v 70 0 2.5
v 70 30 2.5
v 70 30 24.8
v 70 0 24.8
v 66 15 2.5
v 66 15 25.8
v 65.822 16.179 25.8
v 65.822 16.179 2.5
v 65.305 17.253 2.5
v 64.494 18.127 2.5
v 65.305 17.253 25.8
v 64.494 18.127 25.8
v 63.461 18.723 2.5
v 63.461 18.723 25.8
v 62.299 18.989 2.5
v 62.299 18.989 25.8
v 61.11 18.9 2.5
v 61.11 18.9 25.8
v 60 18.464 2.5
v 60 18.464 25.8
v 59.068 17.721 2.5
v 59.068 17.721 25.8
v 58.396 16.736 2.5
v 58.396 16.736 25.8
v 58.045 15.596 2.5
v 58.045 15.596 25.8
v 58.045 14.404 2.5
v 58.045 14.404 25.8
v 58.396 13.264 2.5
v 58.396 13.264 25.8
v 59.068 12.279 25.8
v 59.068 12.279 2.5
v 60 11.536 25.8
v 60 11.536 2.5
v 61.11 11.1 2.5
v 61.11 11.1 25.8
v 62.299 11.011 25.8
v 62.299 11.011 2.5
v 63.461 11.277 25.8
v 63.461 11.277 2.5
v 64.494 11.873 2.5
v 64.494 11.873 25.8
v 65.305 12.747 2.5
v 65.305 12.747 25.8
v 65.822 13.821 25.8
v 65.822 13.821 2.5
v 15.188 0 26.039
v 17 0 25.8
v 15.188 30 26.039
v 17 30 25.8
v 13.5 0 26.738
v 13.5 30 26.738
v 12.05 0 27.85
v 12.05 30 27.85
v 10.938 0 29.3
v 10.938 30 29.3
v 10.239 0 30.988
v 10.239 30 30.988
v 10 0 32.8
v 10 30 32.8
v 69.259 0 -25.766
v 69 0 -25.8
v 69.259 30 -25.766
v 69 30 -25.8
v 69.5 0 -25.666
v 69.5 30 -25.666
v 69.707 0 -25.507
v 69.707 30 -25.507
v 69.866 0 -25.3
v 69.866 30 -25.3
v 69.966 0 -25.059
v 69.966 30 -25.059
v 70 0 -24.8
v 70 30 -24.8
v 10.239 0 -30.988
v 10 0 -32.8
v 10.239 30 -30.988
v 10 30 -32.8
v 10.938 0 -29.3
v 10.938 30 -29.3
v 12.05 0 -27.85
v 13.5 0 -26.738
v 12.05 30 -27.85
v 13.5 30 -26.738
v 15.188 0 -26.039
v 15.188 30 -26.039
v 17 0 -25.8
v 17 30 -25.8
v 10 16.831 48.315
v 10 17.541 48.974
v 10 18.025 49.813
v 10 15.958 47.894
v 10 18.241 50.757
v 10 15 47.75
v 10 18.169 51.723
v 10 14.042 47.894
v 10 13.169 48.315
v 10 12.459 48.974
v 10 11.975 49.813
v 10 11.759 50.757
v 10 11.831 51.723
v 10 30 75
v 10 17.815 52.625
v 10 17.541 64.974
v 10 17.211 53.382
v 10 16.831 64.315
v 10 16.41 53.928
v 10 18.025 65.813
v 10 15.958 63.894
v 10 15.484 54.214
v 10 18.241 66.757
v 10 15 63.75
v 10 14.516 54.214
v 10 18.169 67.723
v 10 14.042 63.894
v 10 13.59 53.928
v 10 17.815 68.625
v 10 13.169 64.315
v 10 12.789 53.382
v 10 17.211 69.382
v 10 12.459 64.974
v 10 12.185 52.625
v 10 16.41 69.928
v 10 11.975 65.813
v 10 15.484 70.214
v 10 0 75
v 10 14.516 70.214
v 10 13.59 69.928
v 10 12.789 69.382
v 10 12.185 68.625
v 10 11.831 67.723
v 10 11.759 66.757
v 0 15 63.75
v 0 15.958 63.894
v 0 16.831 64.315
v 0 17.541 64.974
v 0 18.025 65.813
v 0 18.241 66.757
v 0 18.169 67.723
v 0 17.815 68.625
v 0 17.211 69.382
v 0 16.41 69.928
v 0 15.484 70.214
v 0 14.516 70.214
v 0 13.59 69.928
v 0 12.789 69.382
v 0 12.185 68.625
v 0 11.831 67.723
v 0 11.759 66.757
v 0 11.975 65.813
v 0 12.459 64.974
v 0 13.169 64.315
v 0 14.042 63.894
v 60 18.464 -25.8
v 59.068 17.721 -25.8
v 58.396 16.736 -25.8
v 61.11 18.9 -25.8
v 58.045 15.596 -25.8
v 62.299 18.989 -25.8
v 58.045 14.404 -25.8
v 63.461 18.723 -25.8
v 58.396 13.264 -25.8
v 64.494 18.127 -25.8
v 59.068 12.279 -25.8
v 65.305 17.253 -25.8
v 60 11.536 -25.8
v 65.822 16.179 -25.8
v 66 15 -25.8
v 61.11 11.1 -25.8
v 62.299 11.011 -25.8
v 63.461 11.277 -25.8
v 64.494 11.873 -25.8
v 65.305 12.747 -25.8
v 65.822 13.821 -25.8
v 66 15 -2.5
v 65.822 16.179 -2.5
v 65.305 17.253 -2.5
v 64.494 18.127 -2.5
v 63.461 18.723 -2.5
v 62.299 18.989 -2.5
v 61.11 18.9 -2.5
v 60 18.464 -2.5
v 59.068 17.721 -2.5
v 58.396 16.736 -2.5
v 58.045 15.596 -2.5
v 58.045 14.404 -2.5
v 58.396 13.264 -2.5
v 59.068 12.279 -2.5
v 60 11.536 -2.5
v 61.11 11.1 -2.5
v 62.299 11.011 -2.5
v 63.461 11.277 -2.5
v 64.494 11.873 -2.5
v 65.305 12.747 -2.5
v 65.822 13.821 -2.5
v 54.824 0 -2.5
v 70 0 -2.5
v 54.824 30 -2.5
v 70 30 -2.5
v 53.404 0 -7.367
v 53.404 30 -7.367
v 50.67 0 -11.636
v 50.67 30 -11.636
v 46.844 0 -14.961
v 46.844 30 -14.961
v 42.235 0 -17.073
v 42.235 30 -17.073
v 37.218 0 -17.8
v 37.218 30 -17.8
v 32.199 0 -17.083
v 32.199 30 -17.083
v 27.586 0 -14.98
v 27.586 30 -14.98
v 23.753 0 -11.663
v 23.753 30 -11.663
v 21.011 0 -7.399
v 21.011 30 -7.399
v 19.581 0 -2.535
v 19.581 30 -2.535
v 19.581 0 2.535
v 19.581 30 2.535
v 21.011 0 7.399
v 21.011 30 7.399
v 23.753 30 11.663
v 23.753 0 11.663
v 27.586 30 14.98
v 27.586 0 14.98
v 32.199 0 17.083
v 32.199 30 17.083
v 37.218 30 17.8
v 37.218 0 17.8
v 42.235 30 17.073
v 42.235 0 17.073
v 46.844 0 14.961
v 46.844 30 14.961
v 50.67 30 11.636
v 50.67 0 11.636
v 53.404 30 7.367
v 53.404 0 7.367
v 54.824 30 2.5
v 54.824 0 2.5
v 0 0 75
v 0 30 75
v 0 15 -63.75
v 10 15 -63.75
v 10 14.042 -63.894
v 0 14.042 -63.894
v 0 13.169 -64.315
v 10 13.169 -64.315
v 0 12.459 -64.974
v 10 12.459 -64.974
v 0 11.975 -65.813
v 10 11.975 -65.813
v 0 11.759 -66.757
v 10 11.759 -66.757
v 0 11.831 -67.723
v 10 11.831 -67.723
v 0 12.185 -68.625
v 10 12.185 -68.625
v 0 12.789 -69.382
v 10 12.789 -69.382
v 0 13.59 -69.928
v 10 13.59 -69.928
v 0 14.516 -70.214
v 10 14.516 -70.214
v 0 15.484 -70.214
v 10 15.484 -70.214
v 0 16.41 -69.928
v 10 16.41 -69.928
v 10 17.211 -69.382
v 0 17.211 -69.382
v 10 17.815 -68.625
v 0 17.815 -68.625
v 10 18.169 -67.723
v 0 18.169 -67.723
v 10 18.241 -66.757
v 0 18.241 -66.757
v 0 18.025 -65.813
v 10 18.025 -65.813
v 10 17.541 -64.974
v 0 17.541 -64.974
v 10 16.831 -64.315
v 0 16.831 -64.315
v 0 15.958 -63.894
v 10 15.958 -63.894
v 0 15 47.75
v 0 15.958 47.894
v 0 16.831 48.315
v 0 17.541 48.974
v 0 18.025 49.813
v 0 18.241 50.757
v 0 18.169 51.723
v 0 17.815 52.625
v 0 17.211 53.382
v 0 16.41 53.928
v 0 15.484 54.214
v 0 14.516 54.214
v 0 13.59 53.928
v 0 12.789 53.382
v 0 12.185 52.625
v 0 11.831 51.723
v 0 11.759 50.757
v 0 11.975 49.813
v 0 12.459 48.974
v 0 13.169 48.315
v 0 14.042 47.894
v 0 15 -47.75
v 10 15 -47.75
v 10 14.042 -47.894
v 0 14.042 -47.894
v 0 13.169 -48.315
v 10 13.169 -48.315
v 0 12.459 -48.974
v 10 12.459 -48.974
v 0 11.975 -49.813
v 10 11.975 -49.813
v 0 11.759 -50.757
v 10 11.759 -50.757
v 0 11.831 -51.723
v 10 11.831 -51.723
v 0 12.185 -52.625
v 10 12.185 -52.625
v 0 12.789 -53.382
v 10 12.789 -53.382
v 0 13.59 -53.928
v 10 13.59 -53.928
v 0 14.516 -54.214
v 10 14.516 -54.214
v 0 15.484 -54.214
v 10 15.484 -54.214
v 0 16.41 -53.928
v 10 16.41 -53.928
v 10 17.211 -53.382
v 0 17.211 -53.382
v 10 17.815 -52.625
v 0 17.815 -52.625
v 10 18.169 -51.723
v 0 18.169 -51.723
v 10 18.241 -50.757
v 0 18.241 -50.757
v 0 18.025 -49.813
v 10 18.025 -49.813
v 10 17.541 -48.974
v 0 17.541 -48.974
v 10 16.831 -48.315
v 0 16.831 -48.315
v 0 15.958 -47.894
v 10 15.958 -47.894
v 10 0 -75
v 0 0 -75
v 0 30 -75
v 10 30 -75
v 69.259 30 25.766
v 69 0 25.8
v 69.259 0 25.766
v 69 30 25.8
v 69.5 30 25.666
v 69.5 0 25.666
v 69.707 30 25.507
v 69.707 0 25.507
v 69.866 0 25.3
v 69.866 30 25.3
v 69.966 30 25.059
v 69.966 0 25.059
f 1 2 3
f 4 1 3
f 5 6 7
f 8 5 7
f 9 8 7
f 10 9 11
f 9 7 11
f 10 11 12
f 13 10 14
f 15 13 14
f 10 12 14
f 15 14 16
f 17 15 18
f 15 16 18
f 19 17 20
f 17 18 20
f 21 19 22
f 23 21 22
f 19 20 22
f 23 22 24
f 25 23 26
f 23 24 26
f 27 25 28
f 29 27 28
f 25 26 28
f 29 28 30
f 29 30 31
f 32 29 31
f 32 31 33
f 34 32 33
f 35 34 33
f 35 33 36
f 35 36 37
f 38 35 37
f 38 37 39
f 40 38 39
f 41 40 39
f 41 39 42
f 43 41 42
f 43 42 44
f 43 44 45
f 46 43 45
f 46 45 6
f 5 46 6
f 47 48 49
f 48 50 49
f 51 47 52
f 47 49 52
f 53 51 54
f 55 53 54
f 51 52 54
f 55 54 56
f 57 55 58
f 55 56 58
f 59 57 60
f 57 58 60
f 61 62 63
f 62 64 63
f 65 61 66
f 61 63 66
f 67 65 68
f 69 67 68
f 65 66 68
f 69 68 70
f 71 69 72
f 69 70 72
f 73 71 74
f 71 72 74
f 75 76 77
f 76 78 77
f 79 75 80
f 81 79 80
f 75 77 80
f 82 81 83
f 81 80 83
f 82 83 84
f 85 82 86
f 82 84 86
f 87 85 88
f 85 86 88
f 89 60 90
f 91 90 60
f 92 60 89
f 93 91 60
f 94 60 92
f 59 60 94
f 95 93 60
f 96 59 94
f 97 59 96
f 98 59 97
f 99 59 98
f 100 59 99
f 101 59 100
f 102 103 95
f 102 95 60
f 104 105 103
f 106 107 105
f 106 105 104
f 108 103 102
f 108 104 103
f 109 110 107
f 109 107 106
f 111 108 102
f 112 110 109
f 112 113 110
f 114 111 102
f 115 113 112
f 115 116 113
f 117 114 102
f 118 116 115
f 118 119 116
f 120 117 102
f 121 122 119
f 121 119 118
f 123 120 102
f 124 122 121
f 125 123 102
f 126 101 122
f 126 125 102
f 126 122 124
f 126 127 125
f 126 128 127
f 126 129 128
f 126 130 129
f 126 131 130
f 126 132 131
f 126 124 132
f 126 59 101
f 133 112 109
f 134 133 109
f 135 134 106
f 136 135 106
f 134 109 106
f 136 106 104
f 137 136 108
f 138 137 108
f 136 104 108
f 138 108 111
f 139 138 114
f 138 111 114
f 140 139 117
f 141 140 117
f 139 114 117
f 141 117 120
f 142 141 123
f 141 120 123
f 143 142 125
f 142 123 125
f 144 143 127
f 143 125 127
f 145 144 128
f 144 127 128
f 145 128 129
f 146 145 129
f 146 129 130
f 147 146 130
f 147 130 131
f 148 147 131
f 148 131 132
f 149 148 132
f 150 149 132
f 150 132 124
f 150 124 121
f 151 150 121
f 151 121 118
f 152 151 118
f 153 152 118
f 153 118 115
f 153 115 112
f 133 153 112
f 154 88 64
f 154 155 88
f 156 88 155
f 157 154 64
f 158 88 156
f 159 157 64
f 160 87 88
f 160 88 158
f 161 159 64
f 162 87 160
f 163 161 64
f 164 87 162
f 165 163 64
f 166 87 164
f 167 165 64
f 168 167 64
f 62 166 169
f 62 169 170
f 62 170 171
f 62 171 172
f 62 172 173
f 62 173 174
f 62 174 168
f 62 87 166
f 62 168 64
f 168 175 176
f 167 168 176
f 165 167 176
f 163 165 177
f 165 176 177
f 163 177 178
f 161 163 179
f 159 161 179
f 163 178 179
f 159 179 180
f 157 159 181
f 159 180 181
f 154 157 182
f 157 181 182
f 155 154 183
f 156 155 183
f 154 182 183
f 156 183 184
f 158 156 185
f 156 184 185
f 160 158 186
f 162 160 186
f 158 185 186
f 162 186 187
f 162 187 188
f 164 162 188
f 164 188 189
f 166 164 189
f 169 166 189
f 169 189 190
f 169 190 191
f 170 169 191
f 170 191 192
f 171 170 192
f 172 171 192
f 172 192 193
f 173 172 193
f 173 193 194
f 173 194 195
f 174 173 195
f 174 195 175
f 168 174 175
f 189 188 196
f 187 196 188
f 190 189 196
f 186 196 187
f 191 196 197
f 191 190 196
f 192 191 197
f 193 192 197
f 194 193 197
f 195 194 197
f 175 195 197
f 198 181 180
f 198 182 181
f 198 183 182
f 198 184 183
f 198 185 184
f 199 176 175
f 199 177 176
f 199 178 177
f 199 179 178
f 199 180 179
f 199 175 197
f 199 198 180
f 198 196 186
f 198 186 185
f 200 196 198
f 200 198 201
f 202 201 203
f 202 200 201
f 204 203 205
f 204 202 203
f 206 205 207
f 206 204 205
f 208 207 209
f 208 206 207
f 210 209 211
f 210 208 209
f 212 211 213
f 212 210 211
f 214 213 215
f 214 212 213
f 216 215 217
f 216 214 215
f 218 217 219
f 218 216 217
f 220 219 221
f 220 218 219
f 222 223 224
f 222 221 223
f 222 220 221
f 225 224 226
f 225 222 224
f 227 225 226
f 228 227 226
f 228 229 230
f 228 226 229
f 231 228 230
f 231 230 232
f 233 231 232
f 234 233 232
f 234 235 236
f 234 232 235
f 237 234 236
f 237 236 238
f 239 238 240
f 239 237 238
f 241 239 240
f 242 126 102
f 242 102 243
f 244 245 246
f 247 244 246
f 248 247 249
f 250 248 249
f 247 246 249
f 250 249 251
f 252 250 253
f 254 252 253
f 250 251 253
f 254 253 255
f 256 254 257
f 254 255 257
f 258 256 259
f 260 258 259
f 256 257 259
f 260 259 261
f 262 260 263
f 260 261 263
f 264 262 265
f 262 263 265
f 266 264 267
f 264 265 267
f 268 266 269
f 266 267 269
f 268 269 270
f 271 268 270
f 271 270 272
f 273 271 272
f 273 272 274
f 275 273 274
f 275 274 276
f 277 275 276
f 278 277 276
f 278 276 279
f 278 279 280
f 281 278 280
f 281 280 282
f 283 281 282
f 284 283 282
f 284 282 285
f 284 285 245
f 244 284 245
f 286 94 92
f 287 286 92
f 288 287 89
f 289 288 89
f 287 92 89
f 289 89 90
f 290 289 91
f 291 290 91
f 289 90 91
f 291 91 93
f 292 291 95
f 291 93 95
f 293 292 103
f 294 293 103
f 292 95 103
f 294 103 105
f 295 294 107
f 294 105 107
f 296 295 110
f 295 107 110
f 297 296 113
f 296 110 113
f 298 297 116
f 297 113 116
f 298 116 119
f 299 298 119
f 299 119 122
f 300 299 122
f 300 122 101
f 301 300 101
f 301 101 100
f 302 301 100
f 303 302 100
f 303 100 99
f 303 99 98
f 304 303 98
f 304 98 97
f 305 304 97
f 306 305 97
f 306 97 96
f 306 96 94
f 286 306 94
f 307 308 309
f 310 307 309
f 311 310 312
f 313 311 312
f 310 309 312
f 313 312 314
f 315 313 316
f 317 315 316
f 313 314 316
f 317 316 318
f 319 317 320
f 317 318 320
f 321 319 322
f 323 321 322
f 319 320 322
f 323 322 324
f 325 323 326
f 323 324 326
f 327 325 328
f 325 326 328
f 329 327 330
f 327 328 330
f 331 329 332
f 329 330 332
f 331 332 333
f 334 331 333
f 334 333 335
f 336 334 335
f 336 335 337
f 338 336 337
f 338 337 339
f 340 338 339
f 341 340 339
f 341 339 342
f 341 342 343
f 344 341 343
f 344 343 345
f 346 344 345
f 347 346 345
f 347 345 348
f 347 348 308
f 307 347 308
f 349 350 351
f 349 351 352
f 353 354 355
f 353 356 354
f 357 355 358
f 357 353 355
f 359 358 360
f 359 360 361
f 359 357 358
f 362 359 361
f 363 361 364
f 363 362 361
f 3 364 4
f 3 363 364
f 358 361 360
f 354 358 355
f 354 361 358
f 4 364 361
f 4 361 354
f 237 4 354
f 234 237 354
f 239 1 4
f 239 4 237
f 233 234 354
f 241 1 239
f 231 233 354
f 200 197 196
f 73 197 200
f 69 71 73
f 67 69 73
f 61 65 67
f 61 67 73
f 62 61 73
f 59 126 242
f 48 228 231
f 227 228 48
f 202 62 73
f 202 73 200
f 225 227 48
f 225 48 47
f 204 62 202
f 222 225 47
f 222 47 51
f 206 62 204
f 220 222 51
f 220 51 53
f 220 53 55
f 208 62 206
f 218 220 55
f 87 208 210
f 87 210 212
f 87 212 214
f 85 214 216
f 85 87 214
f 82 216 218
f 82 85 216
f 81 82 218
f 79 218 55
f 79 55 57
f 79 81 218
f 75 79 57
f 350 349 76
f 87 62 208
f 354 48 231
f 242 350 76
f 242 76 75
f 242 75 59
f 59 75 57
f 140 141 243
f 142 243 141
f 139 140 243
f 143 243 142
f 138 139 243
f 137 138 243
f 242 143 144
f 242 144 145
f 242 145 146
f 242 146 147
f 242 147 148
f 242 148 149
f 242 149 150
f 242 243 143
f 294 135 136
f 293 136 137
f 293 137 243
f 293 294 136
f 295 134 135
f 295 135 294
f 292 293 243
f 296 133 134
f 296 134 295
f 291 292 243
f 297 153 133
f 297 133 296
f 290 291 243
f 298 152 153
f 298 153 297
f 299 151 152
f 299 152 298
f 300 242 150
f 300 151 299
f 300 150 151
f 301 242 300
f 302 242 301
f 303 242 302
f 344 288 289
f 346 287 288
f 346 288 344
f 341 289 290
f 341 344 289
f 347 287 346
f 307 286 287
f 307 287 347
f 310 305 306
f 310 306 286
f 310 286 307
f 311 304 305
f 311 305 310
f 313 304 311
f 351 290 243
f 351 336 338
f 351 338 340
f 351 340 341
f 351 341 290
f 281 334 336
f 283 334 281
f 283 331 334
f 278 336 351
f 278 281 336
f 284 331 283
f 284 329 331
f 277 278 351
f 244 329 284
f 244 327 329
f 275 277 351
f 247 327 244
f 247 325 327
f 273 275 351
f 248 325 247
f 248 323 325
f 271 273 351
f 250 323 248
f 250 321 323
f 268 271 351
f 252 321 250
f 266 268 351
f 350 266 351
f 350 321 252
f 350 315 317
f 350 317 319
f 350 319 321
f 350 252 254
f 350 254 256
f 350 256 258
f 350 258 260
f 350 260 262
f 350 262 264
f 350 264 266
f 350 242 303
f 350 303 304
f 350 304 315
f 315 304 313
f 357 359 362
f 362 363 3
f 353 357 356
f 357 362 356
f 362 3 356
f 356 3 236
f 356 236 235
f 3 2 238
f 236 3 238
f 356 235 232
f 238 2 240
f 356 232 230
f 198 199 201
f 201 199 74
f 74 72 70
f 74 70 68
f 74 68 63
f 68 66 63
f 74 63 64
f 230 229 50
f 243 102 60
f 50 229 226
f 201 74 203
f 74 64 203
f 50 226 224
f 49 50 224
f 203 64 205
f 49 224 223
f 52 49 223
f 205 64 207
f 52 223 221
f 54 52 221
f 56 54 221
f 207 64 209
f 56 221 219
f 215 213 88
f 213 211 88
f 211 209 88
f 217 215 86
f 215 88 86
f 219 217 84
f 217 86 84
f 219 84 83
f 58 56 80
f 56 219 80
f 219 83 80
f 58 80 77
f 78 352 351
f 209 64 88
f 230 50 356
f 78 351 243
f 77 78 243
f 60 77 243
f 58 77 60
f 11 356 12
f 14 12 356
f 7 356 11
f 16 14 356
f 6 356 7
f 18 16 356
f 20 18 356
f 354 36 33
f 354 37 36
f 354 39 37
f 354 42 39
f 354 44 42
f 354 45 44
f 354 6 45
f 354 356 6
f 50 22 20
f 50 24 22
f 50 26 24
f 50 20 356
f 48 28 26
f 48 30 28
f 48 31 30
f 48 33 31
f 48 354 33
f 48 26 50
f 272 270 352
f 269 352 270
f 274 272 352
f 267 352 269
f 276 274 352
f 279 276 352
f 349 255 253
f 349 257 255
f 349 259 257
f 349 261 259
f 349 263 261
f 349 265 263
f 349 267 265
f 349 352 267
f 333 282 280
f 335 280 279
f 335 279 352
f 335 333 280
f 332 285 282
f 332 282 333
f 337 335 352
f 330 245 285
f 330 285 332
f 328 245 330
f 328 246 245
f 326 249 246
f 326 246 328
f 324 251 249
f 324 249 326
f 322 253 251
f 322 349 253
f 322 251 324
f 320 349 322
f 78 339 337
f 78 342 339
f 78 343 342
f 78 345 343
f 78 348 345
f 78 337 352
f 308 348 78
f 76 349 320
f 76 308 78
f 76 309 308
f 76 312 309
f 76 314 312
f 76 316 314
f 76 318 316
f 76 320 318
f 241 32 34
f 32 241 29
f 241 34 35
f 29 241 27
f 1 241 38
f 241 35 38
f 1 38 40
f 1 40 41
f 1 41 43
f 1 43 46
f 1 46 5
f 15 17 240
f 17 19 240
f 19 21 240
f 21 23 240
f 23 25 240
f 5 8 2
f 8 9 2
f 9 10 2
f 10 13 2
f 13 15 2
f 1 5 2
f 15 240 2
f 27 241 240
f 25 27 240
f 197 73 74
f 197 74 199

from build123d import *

# Parameters (mm, degrees)
SKETCH4_R                        = 17.8
BOSS_EXTRUDE2_DEPTH              = 30
SKETCH6_W                        = 21.036522063
SKETCH6_H                        = 5
CUT_EXTRUDE3_DEPTH               = 107.887791632
SKETCH7_R                        = 4
KIRISTYSRUUVI_M8_DEPTH           = 127.335426544
SKETCH9_R                        = 3.25
PROFIILN_KIINNITYSREI_T_M6_DEPTH = 101.623058987
FILLET1_R                        = 7
FILLET2_R                        = 1


with BuildPart() as part:
    # Sketch4 → Boss-Extrude2 (new body)
    with BuildSketch(Plane(origin=(0, 0, 0), x_dir=(1, 0, 0), z_dir=(0, 1, 0))):
        Polygon((0, 75), (10, 75), (10, 25.8), (70, 25.8), (70, -25.8), (10, -25.8), (10, -75), (0, -75), align=None)
        with Locations(Location((37.2, 0, 0), (0, 0, 270))):
            Circle(SKETCH4_R, mode=Mode.SUBTRACT)
    extrude(amount=BOSS_EXTRUDE2_DEPTH)

    # Sketch6 → Cut-Extrude3 (cut, through all)
    with BuildSketch(Plane(origin=(0, 30, 0), x_dir=(1, 0, 0), z_dir=(0, 1, 0))):
        with Locations((59.481738968, 0)):
            Rectangle(SKETCH6_W, SKETCH6_H)
    extrude(amount=-CUT_EXTRUDE3_DEPTH, mode=Mode.SUBTRACT)

    # Sketch7 → Kiristysruuvi M8 (cut, through all)
    with BuildSketch(Plane.XY.offset(25.8)):
        with Locations((62, 15)):
            Circle(SKETCH7_R)
    extrude(amount=-KIRISTYSRUUVI_M8_DEPTH, mode=Mode.SUBTRACT)

    # Sketch9 → Profiiln kiinnitysreiät M6 (cut, through all)
    with BuildSketch(Plane(origin=(10, 0, 0), x_dir=(0, 0, -1), z_dir=(1, 0, 0))):
        with Locations((-67, 15)):
            Circle(SKETCH9_R)
        with Locations((-51, 15)):
            Circle(SKETCH9_R)
        with Locations(Location((67, 15, 0), (0, 0, 180))):
            Circle(SKETCH9_R)
        with Locations(Location((51, 15, 0), (0, 0, 180))):
            Circle(SKETCH9_R)
    extrude(amount=-PROFIILN_KIINNITYSREI_T_M6_DEPTH, mode=Mode.SUBTRACT)

    # Fillet1
    fillet1_edges = [part.edges().sort_by_distance(p)[0] for p in [
        (10, 15, -25.8),
        (10, 15, 25.8),
    ]]
    fillet(fillet1_edges, radius=FILLET1_R)

    # Fillet2
    fillet2_edges = [part.edges().sort_by_distance(p)[0] for p in [
        (70, 15, -25.8),
        (70, 15, 25.8),
    ]]
    fillet(fillet2_edges, radius=FILLET2_R)


solid = part.part
